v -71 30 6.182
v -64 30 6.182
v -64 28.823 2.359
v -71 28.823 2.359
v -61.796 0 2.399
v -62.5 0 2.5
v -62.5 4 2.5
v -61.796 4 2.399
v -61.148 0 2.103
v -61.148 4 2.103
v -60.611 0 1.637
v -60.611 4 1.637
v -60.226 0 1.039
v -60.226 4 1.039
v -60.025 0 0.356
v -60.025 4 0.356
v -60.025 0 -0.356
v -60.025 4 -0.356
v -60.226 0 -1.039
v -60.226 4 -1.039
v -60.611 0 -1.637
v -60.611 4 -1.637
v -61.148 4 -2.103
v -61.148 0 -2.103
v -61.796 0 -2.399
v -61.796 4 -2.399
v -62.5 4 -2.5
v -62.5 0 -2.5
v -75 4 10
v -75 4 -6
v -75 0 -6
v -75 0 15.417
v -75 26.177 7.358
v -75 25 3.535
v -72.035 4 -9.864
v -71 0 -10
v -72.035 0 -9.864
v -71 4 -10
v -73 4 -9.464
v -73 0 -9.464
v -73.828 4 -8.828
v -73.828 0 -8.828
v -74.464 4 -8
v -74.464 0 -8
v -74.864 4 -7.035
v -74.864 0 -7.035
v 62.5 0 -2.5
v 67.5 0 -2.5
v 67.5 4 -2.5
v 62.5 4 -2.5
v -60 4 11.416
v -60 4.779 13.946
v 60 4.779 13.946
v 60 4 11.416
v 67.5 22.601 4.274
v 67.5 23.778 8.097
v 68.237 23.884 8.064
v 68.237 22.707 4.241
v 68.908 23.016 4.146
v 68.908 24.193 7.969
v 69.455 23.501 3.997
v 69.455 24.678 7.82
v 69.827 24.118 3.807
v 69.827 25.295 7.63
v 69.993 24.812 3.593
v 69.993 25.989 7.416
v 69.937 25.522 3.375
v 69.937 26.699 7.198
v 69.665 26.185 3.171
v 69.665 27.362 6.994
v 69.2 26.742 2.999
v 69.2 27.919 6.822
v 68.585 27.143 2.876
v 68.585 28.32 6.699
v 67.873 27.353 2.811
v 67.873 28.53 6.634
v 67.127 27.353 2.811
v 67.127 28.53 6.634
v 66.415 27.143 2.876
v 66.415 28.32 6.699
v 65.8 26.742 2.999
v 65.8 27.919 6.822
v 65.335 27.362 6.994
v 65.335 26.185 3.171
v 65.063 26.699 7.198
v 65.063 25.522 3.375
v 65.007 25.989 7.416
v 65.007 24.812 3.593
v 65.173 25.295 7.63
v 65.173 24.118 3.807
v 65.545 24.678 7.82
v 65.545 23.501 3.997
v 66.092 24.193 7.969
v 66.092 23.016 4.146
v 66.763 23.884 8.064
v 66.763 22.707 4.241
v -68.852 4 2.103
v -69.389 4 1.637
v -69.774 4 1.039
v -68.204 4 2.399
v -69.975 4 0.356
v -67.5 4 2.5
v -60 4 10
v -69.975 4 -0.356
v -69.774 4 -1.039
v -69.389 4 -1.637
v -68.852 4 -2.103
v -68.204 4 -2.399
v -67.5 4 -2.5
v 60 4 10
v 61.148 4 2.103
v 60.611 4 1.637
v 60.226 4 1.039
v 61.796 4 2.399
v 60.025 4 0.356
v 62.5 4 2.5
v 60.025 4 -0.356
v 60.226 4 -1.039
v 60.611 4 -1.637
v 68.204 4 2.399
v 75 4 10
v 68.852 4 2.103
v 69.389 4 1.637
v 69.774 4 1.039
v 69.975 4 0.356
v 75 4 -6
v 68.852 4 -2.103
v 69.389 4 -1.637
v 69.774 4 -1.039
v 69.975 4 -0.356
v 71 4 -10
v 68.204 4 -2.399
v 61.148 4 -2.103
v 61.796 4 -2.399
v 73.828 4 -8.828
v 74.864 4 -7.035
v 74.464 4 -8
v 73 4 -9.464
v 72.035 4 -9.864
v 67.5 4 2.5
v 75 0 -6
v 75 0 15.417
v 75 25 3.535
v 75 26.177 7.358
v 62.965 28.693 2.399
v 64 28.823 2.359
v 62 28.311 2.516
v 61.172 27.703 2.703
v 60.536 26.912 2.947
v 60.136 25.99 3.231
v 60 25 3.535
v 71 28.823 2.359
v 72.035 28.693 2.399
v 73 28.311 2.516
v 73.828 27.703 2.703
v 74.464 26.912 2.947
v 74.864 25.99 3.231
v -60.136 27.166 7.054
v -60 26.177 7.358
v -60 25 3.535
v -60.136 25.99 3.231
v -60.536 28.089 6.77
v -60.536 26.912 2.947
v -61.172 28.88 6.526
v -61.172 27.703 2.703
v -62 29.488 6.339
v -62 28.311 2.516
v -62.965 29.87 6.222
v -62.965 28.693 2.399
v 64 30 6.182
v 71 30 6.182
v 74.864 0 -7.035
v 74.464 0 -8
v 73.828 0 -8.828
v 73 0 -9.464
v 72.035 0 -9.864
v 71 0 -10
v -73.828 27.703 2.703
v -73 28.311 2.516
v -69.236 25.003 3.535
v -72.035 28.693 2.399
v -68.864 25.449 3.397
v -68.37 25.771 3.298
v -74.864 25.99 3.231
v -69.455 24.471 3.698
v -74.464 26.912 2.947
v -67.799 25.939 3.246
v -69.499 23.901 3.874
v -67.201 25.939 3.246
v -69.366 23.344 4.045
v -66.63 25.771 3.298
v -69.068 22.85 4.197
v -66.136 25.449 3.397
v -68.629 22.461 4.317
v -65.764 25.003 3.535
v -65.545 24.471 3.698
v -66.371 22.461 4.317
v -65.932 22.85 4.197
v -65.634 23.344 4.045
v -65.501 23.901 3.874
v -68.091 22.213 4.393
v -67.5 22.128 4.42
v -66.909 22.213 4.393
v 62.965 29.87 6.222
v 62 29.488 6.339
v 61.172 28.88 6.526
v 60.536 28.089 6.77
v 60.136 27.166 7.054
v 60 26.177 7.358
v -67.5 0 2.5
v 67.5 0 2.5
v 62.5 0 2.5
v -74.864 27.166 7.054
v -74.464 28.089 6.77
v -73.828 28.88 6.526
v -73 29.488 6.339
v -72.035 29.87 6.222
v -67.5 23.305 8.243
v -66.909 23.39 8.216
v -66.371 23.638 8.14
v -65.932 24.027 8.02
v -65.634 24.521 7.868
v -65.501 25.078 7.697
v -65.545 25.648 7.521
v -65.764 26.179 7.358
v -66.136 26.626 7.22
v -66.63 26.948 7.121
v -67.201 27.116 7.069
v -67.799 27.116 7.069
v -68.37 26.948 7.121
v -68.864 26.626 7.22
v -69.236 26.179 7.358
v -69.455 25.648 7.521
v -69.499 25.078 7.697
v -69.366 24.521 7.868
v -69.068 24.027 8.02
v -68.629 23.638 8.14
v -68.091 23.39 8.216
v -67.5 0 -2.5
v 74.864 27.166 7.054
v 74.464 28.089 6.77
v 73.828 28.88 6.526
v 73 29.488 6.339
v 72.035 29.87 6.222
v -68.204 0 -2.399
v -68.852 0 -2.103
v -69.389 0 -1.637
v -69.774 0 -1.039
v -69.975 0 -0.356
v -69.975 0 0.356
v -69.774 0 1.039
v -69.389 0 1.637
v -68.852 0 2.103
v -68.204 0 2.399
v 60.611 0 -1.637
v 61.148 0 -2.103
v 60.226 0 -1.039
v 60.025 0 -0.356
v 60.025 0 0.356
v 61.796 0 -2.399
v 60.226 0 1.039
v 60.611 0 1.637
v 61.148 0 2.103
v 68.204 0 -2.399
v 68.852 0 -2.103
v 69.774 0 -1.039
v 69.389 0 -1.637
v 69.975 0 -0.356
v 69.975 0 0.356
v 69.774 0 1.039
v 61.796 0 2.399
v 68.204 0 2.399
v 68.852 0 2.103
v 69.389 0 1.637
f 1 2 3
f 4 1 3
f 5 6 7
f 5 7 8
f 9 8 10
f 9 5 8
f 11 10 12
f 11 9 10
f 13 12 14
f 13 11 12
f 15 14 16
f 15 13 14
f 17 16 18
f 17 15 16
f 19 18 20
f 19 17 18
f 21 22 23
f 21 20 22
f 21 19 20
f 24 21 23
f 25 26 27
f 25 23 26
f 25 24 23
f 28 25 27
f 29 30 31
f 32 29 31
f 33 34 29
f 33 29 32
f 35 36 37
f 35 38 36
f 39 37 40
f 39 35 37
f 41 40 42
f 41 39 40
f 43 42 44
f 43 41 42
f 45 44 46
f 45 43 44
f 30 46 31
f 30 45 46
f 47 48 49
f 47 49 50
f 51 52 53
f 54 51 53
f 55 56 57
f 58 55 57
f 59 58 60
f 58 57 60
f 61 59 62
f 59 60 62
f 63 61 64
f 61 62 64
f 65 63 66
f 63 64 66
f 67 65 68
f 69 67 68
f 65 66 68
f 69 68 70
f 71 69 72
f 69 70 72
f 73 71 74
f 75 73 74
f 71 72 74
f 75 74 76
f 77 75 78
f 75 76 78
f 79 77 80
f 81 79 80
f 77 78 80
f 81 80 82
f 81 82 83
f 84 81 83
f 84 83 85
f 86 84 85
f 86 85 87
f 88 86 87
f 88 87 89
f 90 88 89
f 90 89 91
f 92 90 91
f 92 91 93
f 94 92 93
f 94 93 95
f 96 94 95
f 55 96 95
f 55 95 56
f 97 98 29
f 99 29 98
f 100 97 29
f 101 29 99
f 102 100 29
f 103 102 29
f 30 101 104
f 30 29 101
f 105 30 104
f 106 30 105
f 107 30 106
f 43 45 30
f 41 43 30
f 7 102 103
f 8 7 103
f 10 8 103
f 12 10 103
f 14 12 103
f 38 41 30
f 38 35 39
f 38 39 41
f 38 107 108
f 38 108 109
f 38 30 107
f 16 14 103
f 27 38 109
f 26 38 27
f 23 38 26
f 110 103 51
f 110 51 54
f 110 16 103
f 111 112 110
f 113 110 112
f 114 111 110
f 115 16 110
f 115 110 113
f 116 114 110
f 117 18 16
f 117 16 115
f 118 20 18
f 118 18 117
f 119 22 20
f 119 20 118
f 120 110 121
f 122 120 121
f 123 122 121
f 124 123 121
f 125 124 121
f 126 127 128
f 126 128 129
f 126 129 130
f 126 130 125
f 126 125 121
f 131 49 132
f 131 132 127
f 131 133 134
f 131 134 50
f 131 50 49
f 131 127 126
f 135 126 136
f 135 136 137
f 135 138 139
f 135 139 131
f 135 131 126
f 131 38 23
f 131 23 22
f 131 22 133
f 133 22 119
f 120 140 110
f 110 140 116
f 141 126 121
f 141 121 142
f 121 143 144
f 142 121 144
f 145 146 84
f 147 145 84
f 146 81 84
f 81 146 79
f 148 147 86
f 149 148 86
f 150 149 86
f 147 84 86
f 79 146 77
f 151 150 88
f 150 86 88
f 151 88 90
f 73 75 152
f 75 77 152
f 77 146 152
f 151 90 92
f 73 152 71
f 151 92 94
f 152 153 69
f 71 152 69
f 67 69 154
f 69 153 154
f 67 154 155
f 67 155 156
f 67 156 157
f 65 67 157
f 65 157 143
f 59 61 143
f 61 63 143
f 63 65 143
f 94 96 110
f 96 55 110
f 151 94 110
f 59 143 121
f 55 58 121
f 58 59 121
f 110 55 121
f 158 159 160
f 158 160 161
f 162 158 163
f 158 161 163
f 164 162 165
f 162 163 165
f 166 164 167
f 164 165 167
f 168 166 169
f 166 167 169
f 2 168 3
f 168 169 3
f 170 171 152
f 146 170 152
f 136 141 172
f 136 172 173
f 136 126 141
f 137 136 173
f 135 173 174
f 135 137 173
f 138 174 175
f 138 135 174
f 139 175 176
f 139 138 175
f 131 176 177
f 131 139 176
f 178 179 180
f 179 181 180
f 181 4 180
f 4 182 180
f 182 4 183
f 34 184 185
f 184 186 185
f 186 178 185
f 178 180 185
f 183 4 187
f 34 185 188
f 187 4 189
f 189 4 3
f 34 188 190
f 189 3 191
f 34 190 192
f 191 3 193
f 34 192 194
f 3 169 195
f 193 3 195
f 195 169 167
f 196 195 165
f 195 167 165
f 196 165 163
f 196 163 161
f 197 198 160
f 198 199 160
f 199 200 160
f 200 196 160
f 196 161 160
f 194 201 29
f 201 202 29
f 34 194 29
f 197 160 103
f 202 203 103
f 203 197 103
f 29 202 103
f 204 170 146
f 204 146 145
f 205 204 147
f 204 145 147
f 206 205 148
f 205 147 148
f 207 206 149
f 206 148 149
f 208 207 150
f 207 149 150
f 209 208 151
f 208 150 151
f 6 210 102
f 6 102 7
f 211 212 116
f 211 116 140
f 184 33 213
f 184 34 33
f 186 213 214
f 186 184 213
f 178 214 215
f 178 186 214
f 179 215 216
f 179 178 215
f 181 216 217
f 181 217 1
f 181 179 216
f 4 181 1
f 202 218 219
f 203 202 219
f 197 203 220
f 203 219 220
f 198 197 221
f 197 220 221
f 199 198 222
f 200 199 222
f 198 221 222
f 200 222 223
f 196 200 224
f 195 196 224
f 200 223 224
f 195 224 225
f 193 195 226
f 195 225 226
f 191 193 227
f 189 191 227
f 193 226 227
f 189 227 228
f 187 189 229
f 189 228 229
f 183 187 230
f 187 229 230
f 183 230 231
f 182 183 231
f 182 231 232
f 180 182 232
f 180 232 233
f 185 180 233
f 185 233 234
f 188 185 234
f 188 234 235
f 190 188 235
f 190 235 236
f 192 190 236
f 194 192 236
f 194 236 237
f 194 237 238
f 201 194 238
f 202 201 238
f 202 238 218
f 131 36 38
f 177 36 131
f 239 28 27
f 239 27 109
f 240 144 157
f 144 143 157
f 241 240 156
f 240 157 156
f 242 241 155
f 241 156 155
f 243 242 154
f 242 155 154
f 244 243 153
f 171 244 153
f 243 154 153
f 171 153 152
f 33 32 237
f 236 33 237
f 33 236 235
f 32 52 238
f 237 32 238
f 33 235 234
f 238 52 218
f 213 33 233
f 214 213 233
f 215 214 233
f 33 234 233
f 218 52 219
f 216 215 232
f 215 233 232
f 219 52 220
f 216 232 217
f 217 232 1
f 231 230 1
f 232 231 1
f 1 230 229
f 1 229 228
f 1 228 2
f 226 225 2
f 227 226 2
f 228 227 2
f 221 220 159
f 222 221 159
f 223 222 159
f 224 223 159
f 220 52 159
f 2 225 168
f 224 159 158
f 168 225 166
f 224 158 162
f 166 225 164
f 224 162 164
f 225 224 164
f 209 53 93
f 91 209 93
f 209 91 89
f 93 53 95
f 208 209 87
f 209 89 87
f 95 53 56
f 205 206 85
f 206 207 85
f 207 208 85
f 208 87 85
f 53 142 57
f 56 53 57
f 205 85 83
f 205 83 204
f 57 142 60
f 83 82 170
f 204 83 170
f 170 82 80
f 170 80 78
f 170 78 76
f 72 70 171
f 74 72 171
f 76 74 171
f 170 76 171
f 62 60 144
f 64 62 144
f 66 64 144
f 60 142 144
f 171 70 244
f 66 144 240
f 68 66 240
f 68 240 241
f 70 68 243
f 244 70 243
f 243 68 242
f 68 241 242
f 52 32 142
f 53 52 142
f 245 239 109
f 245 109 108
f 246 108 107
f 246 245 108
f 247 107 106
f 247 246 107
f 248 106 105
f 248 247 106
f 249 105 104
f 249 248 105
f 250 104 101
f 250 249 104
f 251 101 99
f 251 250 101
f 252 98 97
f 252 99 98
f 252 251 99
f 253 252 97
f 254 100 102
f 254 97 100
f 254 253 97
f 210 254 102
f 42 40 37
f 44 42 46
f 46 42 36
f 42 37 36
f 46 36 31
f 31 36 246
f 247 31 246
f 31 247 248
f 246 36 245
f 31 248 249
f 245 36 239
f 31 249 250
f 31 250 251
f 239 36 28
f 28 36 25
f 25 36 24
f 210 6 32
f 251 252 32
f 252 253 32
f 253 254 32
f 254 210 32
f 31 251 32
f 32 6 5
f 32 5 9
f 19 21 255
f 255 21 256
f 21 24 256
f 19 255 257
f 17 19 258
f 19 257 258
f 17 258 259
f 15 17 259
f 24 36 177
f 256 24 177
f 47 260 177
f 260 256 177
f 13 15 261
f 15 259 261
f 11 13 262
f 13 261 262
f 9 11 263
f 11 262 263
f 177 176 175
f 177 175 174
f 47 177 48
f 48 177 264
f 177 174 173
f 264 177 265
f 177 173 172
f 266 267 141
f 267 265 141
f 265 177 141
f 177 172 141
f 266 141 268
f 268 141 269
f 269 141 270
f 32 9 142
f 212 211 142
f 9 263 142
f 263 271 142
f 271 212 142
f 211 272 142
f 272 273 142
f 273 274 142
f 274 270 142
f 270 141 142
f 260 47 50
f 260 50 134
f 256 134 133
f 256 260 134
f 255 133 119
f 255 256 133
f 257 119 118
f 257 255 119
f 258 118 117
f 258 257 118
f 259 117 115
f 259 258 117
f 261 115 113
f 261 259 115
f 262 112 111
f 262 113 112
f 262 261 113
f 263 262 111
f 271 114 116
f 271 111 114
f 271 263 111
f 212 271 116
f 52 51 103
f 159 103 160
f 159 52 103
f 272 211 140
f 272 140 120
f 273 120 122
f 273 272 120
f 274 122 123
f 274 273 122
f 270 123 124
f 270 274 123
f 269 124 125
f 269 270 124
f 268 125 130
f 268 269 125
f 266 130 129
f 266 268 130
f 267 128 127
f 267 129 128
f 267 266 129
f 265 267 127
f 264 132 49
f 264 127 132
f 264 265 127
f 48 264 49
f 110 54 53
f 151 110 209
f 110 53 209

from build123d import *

# Parameters (mm, degrees)
SKETCH1_W           = 150
SKETCH1_H           = 20
BOSS_EXTRUDE1_DEPTH = 4
BOSS_EXTRUDE3_DEPTH = 150
SKETCH4_R           = 2.005
SKETCH4_R_2         = 2.5
SKETCH4_W           = 120
SKETCH4_H           = 26.389234781
CUT_EXTRUDE1_DEPTH  = 10
FILLET1_R           = 4
BOSS_EXTRUDE4_DEPTH = 150
CUT_EXTRUDE4_DEPTH  = 10


with BuildPart() as part:
    # Sketch1 → Boss-Extrude1 (new body)
    with BuildSketch(Plane(origin=(0, 0, 0), x_dir=(1, 0, 0), z_dir=(0, 1, 0))):
        Rectangle(SKETCH1_W, SKETCH1_H)
        with BuildLine():
            Line((-67.5, 2.5), (-62.5, 2.5))
            ThreePointArc((-62.5, 2.5), (-60, 0), (-62.5, -2.5))
            Line((-62.5, -2.5), (-67.5, -2.5))
            ThreePointArc((-67.5, -2.5), (-70, 0), (-67.5, 2.5))
        make_face(mode=Mode.SUBTRACT)
        with BuildLine():
            Line((62.5, 2.5), (67.5, 2.5))
            ThreePointArc((67.5, 2.5), (70, 0), (67.5, -2.5))
            Line((67.5, -2.5), (62.5, -2.5))
            ThreePointArc((62.5, -2.5), (60, 0), (62.5, 2.5))
        make_face(mode=Mode.SUBTRACT)
    extrude(amount=BOSS_EXTRUDE1_DEPTH)

    # Sketch3 → Boss-Extrude3 (add)
    with BuildSketch(Plane(origin=(75, 0, 0), x_dir=(0, 0, -1), z_dir=(1, 0, 0))):
        Polygon((-10, 0), (-15.416556228, 0), (-6.181619296, 30), (-2.358652574, 28.823171448), (-10, 4), align=None)
    extrude(amount=-BOSS_EXTRUDE3_DEPTH)

    # Sketch4 → Cut-Extrude1 (cut)
    with BuildSketch(Plane(origin=(0, 4.334920159, 14.082132419), x_dir=(1, 0, 0), z_dir=(0, 0.2942071381037286, 0.9557416805229401))):
        with Locations(Location((-67.5, 21.853573894, 0), (0, 0, 270))):
            Circle(SKETCH4_R)
        with Locations(Location((67.5, 22.843573894, 0), (0, 0, 270))):
            Circle(SKETCH4_R_2)
        with Locations((0, 13.658956504)):
            Rectangle(SKETCH4_W, SKETCH4_H)
    extrude(amount=-CUT_EXTRUDE1_DEPTH, mode=Mode.SUBTRACT)

    # Fillet1
    fillet1_edges = [part.edges().sort_by_distance(p)[0] for p in [
        (75, 29.411585724, 4.270135935),
        (-75, 29.411585724, 4.270135935),
        (-60, 29.411585724, 4.270135935),
        (60, 29.411585724, 4.270135935),
        (-75, 2, -10),
        (75, 2, -10),
    ]]
    fillet(fillet1_edges, radius=FILLET1_R)

    # Sketch5 → Boss-Extrude4 (add)
    with BuildSketch(Plane(origin=(75, 0, 0), x_dir=(0, 0, -1), z_dir=(1, 0, 0))):
        Polygon((6, 4), (6, 0), (-15.416556228, 0), (-14.185231304, 4), align=None)
    extrude(amount=-BOSS_EXTRUDE4_DEPTH)

    # Sketch7 → Cut-Extrude4 (cut)
    with BuildSketch(Plane.XZ):
        with BuildLine():
            Line((-62.5, -2.5), (-67.5, -2.5))
            ThreePointArc((-67.5, -2.5), (-70, 0), (-67.5, 2.5))
            Line((-67.5, 2.5), (-62.5, 2.5))
            ThreePointArc((-62.5, 2.5), (-60, 0), (-62.5, -2.5))
        make_face()
        with BuildLine():
            Line((62.5, 2.5), (67.5, 2.5))
            ThreePointArc((67.5, 2.5), (70, 0), (67.5, -2.5))
            Line((67.5, -2.5), (62.5, -2.5))
            ThreePointArc((62.5, -2.5), (60, 0), (62.5, 2.5))
        make_face()
    extrude(amount=-CUT_EXTRUDE4_DEPTH, mode=Mode.SUBTRACT)


solid = part.part
